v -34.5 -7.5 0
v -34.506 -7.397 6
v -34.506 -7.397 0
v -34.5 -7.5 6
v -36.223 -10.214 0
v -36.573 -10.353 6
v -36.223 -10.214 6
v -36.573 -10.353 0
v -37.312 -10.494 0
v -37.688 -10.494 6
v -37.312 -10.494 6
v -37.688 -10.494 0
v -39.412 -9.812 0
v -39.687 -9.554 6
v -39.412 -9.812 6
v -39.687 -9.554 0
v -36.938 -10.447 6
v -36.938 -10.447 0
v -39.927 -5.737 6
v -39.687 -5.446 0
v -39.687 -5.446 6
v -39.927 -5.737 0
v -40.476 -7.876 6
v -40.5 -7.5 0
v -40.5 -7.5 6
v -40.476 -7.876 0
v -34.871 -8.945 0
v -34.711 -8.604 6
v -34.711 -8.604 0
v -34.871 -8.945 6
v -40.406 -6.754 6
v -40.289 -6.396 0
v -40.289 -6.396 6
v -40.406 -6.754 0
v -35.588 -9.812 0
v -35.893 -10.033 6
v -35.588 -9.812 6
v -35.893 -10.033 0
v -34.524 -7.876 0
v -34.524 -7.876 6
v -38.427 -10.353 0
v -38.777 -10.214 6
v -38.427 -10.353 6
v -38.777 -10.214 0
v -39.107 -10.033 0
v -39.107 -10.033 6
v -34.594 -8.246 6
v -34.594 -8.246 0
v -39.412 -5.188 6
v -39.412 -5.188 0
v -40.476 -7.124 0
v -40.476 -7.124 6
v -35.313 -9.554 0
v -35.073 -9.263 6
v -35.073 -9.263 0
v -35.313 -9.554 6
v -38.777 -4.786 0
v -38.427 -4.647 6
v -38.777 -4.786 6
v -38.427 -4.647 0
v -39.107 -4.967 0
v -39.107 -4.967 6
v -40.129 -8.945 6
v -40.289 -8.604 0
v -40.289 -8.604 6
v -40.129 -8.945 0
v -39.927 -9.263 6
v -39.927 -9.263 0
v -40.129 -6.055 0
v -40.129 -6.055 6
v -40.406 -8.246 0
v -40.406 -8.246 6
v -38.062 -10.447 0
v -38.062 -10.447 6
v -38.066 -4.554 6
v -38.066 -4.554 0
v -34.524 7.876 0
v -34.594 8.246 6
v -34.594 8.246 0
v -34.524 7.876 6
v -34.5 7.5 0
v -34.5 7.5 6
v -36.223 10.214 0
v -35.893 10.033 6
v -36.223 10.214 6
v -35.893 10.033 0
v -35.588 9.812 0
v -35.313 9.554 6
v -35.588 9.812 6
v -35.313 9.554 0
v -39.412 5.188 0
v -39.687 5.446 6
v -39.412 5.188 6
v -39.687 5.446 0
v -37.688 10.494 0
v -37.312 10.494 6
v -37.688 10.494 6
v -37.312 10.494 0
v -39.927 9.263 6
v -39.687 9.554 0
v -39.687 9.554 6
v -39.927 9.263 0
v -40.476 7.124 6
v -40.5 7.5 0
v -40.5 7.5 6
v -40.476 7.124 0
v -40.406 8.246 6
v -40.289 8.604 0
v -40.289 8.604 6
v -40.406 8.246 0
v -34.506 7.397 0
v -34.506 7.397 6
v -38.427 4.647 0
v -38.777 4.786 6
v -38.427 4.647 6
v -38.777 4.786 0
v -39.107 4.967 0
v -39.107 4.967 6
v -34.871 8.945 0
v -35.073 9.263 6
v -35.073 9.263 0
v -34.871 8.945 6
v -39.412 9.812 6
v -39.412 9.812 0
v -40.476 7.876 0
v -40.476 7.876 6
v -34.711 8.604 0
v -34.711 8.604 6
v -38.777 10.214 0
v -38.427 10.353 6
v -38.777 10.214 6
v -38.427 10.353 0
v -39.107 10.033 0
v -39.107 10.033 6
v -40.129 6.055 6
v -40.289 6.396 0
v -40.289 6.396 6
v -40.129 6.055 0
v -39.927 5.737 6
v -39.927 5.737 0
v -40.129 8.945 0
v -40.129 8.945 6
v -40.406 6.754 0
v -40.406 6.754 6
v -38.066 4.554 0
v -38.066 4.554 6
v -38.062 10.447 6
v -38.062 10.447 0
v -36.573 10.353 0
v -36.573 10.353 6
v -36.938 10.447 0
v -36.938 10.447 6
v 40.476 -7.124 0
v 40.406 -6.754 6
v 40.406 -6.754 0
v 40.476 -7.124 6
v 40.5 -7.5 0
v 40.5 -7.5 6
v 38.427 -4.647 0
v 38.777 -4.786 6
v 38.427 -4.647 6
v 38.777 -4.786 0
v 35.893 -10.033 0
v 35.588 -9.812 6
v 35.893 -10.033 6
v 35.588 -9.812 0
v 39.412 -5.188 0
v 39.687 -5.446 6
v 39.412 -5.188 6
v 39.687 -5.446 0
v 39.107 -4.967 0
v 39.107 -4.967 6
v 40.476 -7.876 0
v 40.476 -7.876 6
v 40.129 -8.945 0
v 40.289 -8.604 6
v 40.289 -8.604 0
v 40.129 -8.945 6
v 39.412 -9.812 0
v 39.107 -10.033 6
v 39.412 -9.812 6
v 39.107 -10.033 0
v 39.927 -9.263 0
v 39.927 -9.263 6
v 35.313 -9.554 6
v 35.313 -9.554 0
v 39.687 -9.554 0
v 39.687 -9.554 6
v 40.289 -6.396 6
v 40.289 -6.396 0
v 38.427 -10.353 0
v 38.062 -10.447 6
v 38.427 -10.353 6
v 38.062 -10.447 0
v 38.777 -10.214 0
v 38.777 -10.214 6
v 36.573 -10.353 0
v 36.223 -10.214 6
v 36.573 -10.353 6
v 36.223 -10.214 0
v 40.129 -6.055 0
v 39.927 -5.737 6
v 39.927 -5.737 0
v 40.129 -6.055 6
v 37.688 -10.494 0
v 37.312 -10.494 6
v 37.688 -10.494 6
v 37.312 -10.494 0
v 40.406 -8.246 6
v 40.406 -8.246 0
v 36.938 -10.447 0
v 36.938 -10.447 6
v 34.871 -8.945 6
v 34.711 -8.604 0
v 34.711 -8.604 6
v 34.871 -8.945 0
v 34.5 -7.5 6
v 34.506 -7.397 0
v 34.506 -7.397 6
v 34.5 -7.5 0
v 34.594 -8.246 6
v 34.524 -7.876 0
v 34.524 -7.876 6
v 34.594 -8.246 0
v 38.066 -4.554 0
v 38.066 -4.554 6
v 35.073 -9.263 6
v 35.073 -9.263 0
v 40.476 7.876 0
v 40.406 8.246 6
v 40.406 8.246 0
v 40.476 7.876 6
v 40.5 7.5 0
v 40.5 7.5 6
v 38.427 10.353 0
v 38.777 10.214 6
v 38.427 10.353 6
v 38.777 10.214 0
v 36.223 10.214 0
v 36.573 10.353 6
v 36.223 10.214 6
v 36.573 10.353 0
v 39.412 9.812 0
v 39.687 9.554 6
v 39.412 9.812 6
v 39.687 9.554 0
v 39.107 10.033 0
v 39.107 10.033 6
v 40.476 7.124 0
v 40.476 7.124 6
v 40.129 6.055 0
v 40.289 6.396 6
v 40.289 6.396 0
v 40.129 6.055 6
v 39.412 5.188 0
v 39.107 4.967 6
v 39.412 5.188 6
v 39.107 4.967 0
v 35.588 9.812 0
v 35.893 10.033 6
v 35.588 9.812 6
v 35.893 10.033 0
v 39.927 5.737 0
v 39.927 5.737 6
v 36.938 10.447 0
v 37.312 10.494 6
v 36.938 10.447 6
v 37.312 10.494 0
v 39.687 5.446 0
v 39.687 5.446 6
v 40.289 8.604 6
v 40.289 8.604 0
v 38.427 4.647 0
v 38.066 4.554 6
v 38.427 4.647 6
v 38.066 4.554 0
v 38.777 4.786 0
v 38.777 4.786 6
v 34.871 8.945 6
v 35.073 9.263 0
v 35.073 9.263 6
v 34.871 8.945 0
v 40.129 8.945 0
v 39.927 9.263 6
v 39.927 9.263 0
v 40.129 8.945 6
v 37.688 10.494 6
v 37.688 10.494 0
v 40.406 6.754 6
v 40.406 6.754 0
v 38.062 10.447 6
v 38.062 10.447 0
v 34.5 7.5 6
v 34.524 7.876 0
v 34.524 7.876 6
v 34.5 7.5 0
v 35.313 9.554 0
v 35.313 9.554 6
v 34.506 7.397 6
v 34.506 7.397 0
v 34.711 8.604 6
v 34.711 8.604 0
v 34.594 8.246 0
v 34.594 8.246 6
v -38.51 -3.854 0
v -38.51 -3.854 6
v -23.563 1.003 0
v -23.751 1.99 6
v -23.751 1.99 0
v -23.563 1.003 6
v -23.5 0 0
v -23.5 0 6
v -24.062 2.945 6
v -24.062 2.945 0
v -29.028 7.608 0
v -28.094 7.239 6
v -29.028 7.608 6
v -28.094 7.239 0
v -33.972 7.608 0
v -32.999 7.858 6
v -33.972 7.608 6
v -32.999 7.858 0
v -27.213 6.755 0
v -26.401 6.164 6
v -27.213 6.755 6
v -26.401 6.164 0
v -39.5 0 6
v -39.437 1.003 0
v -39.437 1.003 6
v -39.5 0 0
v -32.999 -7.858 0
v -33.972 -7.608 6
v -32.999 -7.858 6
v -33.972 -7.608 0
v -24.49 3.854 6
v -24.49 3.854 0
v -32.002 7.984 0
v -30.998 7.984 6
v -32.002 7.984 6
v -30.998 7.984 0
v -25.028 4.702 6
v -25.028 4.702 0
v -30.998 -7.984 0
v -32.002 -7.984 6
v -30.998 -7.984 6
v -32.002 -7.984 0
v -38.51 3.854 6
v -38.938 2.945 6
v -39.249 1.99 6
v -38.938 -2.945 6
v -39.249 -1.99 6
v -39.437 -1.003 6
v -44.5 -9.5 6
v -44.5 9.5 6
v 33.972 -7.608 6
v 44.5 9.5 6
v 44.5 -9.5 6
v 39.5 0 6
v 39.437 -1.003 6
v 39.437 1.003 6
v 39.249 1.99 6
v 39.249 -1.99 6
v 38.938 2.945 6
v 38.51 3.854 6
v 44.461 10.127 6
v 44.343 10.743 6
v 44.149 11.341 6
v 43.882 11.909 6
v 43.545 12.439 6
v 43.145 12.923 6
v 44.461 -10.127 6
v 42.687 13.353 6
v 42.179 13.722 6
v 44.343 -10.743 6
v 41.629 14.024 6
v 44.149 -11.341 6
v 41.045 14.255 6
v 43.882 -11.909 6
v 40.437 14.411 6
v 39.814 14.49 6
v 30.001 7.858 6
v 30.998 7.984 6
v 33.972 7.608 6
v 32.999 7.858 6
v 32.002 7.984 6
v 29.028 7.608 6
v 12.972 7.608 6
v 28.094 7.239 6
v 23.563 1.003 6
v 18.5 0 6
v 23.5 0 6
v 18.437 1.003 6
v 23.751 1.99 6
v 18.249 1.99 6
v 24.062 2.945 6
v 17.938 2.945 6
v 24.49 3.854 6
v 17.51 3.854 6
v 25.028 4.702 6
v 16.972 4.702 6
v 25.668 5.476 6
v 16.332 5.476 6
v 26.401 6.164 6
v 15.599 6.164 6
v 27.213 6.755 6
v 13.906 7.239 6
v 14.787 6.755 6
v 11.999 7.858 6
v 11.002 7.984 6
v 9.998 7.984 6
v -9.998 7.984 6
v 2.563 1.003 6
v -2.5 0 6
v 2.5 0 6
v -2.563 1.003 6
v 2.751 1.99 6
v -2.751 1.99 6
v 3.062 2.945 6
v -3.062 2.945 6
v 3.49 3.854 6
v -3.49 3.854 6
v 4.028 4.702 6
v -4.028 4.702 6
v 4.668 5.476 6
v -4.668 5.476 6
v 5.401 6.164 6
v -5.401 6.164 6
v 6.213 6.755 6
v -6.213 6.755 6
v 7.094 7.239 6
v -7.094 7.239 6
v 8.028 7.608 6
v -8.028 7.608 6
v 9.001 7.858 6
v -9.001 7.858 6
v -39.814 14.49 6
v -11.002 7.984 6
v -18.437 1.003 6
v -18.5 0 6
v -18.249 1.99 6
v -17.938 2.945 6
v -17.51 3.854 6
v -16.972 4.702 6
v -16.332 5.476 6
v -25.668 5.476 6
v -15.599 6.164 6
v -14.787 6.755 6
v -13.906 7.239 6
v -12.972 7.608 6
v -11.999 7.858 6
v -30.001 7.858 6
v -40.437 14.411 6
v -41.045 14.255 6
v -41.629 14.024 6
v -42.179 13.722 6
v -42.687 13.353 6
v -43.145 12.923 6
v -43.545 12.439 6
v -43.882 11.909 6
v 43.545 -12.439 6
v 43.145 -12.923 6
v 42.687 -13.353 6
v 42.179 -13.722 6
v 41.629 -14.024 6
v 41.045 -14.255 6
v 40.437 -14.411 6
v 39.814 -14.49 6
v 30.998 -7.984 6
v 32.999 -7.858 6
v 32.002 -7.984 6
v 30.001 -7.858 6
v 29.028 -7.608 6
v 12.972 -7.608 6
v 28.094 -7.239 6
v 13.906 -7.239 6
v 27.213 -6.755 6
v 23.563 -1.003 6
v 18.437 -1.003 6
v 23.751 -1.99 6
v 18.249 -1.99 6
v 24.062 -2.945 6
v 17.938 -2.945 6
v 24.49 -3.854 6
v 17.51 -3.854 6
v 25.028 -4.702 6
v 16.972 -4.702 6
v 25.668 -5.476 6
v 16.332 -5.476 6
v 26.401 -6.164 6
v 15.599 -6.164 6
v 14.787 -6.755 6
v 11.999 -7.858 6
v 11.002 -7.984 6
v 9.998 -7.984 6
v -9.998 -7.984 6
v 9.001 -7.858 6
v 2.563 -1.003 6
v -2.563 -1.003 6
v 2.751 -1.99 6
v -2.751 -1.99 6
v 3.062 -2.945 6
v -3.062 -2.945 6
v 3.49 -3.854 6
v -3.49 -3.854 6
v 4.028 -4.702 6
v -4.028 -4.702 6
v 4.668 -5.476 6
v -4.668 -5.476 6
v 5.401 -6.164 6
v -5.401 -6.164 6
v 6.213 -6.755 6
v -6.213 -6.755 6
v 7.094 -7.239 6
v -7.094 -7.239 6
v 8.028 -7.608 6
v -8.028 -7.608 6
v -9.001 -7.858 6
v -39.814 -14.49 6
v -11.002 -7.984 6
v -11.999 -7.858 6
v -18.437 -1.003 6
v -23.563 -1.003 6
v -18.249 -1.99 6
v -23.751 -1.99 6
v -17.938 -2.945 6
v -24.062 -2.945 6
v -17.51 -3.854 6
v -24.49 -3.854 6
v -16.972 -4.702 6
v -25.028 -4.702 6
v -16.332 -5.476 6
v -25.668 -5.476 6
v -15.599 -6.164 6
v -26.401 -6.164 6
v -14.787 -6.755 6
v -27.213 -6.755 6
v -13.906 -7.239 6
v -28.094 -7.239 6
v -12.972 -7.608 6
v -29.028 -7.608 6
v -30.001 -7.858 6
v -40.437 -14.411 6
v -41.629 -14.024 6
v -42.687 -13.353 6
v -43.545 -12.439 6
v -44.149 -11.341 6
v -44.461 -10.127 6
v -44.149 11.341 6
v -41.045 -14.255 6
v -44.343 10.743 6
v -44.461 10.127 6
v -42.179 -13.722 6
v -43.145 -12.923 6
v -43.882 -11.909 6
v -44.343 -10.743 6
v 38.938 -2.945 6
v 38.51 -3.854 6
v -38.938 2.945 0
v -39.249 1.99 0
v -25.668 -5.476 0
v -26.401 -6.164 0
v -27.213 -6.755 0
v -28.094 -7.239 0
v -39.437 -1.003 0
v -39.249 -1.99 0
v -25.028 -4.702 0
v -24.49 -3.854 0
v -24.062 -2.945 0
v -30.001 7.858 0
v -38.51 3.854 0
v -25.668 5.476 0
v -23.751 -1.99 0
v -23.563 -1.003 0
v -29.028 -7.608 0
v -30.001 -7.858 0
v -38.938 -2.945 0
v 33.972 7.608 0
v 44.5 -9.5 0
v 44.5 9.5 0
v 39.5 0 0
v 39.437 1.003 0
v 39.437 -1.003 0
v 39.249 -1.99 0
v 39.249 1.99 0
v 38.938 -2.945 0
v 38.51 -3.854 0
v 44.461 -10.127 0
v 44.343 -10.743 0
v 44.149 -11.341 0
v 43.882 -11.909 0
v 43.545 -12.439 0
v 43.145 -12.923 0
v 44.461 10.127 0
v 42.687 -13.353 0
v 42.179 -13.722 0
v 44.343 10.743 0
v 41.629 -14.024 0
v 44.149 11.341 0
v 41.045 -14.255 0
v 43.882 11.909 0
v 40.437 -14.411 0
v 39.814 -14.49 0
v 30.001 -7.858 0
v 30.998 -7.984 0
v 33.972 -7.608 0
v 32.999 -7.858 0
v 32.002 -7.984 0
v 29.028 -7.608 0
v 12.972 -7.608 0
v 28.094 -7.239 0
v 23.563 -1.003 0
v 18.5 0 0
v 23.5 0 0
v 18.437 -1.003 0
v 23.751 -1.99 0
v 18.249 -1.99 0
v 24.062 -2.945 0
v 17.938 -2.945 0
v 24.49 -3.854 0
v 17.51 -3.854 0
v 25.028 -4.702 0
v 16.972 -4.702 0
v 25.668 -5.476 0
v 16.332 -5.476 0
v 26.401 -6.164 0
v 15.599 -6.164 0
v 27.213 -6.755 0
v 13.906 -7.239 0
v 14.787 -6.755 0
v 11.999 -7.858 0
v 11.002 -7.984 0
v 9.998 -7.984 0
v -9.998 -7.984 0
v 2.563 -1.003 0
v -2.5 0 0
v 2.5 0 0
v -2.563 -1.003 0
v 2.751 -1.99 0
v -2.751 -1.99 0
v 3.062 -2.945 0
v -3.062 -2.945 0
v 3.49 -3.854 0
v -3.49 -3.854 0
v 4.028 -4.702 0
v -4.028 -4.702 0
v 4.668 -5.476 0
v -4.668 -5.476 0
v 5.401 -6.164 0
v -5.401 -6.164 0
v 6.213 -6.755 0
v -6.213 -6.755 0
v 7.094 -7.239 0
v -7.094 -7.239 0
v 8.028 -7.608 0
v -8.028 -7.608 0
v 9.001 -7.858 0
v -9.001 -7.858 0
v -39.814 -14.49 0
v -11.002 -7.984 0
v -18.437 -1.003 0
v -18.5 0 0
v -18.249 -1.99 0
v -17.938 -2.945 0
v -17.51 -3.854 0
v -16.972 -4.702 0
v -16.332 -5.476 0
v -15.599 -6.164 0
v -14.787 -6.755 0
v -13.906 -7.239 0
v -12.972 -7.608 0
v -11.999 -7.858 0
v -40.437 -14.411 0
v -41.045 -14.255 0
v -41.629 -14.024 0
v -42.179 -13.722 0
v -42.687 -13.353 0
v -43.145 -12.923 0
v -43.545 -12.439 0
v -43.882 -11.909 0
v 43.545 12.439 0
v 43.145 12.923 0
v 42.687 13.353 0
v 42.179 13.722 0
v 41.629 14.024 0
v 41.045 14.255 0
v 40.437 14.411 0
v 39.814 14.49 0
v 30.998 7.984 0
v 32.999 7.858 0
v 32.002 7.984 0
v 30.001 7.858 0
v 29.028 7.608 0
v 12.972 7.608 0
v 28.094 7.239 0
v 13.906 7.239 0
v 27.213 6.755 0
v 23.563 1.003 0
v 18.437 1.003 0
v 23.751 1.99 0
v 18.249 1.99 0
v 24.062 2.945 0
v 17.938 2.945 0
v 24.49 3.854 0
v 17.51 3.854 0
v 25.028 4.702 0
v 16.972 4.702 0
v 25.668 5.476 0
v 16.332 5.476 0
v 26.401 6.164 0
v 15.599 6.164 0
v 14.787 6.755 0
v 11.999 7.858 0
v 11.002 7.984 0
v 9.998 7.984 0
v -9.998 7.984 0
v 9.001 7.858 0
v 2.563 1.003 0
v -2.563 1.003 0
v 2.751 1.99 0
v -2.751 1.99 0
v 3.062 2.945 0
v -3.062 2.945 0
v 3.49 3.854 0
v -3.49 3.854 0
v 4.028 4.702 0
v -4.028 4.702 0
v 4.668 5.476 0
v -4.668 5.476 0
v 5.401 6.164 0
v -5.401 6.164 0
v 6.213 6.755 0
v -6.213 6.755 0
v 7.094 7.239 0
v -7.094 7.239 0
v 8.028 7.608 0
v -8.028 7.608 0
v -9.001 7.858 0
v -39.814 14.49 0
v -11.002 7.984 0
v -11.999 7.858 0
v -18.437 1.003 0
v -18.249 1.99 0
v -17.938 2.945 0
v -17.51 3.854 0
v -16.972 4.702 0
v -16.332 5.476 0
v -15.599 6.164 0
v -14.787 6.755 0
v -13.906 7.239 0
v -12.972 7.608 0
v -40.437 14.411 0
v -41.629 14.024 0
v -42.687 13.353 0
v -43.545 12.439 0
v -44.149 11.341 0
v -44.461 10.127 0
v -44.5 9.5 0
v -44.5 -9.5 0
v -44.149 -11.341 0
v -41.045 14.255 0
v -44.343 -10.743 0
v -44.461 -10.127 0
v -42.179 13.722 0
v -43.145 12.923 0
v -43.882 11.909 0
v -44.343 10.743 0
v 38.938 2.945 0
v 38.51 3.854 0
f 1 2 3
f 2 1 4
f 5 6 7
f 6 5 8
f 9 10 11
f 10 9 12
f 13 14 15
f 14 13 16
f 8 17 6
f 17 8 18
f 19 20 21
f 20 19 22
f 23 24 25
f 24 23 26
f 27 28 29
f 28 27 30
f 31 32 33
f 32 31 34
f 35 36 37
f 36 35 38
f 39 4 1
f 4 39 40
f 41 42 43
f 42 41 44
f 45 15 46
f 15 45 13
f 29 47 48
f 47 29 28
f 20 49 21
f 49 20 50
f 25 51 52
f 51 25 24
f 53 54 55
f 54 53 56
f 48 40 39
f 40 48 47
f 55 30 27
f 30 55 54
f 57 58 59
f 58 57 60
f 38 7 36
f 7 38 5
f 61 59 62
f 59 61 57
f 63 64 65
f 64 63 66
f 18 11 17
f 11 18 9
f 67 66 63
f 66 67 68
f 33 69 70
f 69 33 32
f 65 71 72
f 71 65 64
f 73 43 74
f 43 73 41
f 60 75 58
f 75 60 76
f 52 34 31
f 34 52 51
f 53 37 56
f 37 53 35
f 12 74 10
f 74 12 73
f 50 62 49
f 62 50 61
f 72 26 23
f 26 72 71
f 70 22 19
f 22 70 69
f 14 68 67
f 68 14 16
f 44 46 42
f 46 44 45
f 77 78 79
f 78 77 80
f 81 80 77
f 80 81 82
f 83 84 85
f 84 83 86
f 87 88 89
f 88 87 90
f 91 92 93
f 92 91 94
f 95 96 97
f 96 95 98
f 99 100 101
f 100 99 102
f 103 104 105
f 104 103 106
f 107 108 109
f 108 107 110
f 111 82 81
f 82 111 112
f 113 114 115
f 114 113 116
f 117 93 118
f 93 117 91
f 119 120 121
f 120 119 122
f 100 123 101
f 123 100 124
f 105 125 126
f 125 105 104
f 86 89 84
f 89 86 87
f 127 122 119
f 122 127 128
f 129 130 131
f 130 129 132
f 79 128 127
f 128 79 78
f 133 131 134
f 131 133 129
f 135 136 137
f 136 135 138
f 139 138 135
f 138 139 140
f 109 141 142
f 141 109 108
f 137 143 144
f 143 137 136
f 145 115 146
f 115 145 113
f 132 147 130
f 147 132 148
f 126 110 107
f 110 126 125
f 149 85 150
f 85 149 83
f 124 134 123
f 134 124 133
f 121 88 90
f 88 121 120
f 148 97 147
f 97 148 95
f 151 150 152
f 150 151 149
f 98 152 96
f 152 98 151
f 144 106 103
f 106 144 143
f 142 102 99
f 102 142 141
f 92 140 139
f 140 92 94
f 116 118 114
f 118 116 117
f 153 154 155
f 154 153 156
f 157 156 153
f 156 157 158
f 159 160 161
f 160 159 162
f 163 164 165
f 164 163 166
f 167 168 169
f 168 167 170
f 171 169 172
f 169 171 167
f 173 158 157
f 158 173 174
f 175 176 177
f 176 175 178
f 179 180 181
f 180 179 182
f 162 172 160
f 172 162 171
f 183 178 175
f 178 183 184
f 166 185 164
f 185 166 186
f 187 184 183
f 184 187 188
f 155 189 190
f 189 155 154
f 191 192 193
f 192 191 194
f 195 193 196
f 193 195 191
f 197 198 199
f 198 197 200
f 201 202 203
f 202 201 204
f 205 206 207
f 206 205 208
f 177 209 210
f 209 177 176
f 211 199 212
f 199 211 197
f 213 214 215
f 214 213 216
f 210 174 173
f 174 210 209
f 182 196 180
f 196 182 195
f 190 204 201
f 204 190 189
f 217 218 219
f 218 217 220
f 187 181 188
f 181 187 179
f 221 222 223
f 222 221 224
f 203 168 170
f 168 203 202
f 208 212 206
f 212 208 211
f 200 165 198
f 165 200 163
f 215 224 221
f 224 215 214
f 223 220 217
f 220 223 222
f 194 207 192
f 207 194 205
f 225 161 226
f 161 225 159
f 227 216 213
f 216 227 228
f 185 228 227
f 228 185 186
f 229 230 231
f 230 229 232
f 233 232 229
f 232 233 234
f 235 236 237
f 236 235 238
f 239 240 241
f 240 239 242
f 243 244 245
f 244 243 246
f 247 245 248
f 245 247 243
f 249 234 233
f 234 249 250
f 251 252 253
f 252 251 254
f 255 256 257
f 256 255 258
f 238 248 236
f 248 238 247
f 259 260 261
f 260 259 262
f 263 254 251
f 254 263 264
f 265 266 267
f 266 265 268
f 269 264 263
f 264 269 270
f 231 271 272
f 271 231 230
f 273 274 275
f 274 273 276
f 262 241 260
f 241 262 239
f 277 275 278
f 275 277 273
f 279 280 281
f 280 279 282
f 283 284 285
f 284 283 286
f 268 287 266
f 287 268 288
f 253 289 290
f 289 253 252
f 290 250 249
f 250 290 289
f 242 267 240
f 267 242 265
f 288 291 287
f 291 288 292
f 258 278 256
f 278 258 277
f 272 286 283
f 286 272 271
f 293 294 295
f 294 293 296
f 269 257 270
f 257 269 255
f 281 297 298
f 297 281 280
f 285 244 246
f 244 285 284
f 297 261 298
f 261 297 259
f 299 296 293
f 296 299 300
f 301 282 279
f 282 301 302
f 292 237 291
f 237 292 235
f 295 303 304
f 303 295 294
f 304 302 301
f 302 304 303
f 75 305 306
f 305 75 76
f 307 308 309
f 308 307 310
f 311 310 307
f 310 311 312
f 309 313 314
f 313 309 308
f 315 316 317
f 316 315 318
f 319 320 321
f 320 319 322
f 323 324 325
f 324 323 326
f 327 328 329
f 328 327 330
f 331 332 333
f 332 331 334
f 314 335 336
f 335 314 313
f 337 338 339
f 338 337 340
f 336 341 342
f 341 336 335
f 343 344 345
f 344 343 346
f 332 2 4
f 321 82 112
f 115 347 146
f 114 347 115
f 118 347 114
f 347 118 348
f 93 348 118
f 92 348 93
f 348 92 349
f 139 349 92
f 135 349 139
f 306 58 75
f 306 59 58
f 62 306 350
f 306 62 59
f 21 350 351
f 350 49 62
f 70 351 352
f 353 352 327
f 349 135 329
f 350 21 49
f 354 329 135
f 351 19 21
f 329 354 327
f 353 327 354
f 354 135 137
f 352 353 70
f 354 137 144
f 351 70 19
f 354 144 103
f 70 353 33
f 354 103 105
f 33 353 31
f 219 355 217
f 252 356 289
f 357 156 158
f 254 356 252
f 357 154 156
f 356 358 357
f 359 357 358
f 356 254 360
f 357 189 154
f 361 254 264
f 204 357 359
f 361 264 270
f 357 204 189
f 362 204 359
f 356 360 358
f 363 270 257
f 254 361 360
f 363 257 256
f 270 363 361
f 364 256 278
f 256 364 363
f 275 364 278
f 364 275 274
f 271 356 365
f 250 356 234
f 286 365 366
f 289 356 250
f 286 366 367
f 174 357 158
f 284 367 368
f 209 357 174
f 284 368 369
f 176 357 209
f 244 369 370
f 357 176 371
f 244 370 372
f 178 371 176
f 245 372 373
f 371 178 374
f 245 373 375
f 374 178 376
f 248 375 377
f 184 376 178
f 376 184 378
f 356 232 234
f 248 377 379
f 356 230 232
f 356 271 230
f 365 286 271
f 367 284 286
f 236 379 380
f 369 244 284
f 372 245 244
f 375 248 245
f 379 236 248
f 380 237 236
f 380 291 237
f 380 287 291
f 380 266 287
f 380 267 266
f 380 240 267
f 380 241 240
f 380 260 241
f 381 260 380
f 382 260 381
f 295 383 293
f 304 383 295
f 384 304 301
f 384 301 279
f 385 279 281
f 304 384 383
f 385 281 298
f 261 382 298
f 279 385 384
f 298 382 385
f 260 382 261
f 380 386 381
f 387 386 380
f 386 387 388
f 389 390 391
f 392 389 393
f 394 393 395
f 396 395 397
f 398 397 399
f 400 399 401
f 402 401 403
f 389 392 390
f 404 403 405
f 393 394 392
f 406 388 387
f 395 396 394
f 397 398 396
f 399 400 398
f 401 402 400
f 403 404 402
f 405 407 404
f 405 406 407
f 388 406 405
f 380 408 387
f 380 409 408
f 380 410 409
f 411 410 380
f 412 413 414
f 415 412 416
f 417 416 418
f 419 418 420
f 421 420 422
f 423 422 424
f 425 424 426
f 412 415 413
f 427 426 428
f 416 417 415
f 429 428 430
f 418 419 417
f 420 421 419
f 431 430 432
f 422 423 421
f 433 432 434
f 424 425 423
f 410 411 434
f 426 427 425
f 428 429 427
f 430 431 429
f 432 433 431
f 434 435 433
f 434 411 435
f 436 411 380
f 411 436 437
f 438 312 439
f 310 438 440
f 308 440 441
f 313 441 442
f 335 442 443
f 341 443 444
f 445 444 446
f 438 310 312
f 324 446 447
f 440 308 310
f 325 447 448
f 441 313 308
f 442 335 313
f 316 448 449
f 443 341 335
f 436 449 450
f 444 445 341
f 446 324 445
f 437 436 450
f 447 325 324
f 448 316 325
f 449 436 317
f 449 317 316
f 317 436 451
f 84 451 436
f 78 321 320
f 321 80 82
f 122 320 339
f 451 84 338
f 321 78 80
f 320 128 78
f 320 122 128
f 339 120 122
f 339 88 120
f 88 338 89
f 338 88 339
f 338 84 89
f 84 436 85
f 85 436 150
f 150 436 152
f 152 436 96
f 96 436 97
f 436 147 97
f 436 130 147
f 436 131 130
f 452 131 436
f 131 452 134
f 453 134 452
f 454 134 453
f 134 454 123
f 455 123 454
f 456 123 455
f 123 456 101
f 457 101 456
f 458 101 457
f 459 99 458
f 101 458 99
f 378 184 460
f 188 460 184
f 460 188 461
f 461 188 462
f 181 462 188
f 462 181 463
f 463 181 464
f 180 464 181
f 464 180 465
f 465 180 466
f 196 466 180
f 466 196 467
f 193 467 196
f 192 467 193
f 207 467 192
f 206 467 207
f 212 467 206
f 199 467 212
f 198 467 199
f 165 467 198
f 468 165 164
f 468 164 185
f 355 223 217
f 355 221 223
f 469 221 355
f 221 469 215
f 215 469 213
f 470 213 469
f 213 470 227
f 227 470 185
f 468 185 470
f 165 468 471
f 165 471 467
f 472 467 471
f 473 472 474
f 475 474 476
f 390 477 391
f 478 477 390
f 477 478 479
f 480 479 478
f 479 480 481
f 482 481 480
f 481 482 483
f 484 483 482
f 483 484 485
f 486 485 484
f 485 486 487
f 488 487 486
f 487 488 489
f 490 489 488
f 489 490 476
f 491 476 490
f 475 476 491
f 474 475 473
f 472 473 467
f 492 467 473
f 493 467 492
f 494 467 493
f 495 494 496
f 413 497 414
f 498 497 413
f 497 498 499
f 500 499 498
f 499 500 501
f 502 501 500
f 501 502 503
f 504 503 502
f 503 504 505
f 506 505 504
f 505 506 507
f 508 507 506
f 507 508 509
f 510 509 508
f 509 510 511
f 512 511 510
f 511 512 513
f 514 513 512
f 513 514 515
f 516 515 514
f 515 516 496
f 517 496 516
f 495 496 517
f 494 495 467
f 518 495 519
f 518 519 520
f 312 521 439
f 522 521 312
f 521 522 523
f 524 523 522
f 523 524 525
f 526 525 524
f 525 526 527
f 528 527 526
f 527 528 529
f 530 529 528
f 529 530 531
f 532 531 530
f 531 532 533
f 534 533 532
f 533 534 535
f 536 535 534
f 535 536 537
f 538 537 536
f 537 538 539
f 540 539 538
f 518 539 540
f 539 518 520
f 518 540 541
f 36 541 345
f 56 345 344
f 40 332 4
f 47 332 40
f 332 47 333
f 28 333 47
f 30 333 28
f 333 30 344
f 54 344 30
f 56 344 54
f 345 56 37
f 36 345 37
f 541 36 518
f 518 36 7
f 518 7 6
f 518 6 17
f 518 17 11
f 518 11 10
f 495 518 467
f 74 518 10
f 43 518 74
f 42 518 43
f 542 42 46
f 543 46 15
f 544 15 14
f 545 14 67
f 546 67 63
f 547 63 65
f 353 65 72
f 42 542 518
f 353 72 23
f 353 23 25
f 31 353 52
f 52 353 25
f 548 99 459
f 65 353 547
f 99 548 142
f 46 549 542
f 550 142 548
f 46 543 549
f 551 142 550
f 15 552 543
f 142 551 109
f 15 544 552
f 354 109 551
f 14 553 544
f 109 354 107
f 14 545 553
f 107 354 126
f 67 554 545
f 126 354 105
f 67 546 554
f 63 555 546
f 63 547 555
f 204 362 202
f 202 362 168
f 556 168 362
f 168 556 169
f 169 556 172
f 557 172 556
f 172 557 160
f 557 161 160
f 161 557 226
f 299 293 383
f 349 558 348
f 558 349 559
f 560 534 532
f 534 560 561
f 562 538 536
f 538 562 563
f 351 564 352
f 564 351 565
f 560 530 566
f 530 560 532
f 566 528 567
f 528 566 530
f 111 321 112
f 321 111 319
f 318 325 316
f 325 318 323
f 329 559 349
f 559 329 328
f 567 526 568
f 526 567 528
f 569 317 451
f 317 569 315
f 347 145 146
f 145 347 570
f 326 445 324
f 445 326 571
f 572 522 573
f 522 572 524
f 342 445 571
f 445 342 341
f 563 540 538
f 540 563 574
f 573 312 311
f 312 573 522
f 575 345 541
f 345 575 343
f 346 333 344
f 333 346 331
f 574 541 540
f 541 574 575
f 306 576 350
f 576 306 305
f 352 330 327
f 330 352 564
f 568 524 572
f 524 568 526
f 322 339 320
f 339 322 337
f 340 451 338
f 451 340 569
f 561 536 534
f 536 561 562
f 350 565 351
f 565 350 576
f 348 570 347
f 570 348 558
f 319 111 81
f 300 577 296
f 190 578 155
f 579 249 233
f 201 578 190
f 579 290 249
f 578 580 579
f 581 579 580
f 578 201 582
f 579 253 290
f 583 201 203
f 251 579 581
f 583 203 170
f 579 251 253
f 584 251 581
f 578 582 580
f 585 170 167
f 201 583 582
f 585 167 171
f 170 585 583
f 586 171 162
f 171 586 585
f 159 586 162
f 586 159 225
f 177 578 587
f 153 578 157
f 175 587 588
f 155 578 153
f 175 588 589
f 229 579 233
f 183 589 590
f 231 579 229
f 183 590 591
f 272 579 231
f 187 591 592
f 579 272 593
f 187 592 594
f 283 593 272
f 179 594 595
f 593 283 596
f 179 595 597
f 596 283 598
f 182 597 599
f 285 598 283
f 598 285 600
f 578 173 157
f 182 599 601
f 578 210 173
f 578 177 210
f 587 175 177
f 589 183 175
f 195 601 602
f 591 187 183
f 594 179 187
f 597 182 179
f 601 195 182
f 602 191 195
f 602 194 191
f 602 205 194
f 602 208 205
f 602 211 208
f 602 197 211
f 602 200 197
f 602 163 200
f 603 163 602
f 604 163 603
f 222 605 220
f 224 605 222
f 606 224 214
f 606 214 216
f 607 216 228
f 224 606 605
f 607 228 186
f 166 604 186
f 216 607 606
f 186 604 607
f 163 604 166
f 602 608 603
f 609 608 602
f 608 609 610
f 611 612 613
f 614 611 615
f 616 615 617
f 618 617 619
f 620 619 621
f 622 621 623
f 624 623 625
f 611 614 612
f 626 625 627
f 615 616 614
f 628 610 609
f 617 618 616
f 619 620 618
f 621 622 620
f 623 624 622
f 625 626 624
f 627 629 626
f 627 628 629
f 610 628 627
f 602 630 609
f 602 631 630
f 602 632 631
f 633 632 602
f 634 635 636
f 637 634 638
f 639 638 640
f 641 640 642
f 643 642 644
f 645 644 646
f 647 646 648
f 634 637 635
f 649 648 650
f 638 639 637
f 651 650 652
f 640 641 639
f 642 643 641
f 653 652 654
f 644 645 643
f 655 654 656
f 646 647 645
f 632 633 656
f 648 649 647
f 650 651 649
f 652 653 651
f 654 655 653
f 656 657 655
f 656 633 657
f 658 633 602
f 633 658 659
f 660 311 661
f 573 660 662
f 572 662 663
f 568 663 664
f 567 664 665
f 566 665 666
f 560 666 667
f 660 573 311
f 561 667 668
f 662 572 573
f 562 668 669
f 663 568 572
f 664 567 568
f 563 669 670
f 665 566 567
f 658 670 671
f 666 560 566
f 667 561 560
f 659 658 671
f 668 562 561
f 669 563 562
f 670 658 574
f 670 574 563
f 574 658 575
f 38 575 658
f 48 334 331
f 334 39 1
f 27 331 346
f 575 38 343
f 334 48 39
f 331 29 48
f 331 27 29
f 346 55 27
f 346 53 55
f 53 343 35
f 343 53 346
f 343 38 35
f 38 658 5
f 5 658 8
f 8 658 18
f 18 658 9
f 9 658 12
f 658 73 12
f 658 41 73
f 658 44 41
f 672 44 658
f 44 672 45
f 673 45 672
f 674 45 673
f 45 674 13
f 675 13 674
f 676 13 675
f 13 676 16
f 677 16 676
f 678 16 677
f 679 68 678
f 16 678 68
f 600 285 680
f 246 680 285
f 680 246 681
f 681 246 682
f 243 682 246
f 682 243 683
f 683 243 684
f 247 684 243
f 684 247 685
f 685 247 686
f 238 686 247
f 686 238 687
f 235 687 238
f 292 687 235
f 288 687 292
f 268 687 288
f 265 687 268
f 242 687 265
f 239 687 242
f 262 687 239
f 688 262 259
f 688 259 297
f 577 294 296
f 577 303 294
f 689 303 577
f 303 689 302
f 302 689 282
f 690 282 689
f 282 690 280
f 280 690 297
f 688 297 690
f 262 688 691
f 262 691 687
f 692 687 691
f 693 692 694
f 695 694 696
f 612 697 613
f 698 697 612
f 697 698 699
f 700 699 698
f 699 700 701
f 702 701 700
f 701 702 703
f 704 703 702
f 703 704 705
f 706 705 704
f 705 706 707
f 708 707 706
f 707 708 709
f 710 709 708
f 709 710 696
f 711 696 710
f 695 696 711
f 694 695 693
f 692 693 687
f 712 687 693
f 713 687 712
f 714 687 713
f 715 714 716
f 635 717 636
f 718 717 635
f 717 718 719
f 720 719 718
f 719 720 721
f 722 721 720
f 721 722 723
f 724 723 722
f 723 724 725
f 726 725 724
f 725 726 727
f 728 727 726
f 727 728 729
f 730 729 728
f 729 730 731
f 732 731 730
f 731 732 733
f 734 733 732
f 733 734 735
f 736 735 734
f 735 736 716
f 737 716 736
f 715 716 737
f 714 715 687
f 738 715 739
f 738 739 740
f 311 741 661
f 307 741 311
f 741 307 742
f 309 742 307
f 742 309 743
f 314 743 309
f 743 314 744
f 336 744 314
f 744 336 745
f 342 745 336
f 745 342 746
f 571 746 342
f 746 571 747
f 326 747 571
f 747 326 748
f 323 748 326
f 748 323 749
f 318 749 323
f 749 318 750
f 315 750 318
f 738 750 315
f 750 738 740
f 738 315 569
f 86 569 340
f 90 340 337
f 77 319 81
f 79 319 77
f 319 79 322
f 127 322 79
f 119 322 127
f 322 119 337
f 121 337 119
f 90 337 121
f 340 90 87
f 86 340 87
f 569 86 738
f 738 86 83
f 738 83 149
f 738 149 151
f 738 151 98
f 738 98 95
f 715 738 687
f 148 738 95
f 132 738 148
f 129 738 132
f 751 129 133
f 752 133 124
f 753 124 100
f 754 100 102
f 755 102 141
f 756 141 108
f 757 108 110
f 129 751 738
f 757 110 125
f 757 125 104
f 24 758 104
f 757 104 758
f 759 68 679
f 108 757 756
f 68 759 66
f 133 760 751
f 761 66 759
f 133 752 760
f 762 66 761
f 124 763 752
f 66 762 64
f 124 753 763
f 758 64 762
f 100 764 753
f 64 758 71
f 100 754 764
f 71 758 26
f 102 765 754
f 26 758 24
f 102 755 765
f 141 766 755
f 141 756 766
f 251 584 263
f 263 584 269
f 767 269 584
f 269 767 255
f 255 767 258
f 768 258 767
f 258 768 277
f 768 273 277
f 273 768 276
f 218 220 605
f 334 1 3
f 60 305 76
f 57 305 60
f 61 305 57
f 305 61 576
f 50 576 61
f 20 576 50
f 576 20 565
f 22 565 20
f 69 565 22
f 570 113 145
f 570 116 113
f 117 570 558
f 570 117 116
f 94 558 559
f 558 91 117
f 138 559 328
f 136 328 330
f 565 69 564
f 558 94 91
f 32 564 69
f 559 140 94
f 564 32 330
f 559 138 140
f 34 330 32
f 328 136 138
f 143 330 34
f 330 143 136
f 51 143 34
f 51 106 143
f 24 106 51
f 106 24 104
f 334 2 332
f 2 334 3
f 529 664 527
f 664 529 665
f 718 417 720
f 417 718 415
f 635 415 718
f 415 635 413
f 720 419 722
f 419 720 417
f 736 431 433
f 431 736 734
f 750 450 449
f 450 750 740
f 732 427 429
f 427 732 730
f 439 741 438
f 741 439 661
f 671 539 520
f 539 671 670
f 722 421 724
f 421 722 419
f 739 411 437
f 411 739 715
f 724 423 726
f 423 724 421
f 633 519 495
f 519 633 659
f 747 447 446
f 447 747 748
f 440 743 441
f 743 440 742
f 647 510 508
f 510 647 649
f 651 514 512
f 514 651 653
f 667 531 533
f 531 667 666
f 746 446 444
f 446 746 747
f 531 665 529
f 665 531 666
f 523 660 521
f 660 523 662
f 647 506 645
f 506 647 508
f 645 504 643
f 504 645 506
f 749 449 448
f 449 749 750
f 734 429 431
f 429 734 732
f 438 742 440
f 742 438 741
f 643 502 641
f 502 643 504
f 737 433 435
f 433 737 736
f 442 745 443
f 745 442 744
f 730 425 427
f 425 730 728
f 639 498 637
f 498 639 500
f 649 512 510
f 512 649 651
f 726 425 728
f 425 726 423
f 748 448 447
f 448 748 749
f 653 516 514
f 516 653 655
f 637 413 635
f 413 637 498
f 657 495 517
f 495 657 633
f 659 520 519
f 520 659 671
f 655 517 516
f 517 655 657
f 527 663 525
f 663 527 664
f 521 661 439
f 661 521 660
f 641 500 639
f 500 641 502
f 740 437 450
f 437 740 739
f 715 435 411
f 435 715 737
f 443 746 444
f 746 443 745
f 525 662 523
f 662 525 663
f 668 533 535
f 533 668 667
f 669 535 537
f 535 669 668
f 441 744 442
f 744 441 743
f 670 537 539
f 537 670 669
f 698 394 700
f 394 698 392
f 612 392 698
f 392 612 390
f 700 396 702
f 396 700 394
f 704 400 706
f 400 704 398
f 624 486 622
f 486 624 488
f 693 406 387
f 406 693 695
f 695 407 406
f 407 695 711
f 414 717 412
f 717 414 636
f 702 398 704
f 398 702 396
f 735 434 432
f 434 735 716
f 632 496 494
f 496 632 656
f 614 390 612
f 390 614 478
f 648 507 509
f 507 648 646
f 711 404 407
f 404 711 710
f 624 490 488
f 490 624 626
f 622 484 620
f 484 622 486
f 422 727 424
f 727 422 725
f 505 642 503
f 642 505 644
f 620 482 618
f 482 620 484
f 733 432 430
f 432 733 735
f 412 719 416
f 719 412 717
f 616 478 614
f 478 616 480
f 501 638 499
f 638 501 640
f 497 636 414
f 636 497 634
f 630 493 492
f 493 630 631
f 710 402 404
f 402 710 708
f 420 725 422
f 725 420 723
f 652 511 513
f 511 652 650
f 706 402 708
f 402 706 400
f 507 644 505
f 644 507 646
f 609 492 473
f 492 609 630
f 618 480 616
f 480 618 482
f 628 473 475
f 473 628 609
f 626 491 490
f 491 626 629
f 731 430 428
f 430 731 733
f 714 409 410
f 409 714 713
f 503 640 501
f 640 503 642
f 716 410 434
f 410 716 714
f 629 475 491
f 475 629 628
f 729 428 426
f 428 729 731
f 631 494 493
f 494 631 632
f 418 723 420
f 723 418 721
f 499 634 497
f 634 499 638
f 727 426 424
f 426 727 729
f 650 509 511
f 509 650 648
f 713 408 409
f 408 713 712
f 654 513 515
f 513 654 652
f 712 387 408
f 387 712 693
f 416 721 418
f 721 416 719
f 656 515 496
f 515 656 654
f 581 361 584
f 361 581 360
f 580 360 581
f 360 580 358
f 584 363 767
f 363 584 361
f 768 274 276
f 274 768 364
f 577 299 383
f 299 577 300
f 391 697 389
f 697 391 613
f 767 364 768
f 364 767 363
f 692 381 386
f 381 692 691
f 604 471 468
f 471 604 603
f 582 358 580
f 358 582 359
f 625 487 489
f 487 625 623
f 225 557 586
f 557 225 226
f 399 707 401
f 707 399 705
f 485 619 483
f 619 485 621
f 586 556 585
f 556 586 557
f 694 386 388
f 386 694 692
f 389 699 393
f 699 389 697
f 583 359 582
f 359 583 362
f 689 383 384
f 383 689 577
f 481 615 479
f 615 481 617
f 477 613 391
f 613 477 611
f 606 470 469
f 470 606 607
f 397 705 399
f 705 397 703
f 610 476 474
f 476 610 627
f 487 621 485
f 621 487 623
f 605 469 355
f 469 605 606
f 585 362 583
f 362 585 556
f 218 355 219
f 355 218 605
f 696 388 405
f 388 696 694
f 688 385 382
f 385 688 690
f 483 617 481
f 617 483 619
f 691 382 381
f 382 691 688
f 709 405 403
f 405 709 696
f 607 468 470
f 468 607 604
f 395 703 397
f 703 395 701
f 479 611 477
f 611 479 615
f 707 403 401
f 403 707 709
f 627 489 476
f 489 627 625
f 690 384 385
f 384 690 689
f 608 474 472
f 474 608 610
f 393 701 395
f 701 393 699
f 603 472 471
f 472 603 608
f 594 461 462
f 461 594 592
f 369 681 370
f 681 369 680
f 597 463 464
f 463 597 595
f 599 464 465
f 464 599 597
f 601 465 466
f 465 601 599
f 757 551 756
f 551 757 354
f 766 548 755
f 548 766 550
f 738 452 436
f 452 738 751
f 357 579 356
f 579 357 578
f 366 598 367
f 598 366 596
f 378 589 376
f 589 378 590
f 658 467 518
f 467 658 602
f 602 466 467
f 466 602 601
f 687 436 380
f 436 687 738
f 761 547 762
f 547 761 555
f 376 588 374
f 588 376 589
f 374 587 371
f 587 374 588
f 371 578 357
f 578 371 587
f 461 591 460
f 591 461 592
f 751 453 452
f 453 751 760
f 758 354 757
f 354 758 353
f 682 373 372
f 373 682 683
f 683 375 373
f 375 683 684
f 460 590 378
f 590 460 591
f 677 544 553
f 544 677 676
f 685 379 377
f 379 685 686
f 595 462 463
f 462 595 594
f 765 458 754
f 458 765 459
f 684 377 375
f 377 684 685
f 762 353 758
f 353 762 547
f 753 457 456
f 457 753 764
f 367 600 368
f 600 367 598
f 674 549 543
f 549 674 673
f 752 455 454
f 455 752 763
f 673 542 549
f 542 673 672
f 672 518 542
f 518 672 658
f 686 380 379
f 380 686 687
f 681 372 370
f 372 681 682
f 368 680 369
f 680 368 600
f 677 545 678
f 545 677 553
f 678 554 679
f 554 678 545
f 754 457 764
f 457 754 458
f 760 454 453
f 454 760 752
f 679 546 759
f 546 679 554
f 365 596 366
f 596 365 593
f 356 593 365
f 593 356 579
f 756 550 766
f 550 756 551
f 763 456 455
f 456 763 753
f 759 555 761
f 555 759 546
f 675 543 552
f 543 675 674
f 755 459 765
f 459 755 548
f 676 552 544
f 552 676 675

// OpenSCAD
$fn = 50;


difference() {
	union() {
		hull() {
			translate(v = [-39.5000000000, 9.5000000000, 0]) {
				cylinder(h = 6, r = 5);
			}
			translate(v = [39.5000000000, 9.5000000000, 0]) {
				cylinder(h = 6, r = 5);
			}
			translate(v = [-39.5000000000, -9.5000000000, 0]) {
				cylinder(h = 6, r = 5);
			}
			translate(v = [39.5000000000, -9.5000000000, 0]) {
				cylinder(h = 6, r = 5);
			}
		}
	}
	union() {
		#translate(v = [-37.5000000000, -7.5000000000, -100.0000000000]) {
			cylinder(h = 200, r = 3.0000000000);
		}
		#translate(v = [-37.5000000000, 7.5000000000, -100.0000000000]) {
			cylinder(h = 200, r = 3.0000000000);
		}
		#translate(v = [37.5000000000, -7.5000000000, -100.0000000000]) {
			cylinder(h = 200, r = 3.0000000000);
		}
		#translate(v = [37.5000000000, 7.5000000000, -100.0000000000]) {
			cylinder(h = 200, r = 3.0000000000);
		}
		#translate(v = [-31.5000000000, 0, 0]) {
			cylinder(h = 6, r = 8.0000000000);
		}
		#translate(v = [-10.5000000000, 0, 0]) {
			cylinder(h = 6, r = 8.0000000000);
		}
		#translate(v = [10.5000000000, 0, 0]) {
			cylinder(h = 6, r = 8.0000000000);
		}
		#translate(v = [31.5000000000, 0, 0]) {
			cylinder(h = 6, r = 8.0000000000);
		}
	}
}
